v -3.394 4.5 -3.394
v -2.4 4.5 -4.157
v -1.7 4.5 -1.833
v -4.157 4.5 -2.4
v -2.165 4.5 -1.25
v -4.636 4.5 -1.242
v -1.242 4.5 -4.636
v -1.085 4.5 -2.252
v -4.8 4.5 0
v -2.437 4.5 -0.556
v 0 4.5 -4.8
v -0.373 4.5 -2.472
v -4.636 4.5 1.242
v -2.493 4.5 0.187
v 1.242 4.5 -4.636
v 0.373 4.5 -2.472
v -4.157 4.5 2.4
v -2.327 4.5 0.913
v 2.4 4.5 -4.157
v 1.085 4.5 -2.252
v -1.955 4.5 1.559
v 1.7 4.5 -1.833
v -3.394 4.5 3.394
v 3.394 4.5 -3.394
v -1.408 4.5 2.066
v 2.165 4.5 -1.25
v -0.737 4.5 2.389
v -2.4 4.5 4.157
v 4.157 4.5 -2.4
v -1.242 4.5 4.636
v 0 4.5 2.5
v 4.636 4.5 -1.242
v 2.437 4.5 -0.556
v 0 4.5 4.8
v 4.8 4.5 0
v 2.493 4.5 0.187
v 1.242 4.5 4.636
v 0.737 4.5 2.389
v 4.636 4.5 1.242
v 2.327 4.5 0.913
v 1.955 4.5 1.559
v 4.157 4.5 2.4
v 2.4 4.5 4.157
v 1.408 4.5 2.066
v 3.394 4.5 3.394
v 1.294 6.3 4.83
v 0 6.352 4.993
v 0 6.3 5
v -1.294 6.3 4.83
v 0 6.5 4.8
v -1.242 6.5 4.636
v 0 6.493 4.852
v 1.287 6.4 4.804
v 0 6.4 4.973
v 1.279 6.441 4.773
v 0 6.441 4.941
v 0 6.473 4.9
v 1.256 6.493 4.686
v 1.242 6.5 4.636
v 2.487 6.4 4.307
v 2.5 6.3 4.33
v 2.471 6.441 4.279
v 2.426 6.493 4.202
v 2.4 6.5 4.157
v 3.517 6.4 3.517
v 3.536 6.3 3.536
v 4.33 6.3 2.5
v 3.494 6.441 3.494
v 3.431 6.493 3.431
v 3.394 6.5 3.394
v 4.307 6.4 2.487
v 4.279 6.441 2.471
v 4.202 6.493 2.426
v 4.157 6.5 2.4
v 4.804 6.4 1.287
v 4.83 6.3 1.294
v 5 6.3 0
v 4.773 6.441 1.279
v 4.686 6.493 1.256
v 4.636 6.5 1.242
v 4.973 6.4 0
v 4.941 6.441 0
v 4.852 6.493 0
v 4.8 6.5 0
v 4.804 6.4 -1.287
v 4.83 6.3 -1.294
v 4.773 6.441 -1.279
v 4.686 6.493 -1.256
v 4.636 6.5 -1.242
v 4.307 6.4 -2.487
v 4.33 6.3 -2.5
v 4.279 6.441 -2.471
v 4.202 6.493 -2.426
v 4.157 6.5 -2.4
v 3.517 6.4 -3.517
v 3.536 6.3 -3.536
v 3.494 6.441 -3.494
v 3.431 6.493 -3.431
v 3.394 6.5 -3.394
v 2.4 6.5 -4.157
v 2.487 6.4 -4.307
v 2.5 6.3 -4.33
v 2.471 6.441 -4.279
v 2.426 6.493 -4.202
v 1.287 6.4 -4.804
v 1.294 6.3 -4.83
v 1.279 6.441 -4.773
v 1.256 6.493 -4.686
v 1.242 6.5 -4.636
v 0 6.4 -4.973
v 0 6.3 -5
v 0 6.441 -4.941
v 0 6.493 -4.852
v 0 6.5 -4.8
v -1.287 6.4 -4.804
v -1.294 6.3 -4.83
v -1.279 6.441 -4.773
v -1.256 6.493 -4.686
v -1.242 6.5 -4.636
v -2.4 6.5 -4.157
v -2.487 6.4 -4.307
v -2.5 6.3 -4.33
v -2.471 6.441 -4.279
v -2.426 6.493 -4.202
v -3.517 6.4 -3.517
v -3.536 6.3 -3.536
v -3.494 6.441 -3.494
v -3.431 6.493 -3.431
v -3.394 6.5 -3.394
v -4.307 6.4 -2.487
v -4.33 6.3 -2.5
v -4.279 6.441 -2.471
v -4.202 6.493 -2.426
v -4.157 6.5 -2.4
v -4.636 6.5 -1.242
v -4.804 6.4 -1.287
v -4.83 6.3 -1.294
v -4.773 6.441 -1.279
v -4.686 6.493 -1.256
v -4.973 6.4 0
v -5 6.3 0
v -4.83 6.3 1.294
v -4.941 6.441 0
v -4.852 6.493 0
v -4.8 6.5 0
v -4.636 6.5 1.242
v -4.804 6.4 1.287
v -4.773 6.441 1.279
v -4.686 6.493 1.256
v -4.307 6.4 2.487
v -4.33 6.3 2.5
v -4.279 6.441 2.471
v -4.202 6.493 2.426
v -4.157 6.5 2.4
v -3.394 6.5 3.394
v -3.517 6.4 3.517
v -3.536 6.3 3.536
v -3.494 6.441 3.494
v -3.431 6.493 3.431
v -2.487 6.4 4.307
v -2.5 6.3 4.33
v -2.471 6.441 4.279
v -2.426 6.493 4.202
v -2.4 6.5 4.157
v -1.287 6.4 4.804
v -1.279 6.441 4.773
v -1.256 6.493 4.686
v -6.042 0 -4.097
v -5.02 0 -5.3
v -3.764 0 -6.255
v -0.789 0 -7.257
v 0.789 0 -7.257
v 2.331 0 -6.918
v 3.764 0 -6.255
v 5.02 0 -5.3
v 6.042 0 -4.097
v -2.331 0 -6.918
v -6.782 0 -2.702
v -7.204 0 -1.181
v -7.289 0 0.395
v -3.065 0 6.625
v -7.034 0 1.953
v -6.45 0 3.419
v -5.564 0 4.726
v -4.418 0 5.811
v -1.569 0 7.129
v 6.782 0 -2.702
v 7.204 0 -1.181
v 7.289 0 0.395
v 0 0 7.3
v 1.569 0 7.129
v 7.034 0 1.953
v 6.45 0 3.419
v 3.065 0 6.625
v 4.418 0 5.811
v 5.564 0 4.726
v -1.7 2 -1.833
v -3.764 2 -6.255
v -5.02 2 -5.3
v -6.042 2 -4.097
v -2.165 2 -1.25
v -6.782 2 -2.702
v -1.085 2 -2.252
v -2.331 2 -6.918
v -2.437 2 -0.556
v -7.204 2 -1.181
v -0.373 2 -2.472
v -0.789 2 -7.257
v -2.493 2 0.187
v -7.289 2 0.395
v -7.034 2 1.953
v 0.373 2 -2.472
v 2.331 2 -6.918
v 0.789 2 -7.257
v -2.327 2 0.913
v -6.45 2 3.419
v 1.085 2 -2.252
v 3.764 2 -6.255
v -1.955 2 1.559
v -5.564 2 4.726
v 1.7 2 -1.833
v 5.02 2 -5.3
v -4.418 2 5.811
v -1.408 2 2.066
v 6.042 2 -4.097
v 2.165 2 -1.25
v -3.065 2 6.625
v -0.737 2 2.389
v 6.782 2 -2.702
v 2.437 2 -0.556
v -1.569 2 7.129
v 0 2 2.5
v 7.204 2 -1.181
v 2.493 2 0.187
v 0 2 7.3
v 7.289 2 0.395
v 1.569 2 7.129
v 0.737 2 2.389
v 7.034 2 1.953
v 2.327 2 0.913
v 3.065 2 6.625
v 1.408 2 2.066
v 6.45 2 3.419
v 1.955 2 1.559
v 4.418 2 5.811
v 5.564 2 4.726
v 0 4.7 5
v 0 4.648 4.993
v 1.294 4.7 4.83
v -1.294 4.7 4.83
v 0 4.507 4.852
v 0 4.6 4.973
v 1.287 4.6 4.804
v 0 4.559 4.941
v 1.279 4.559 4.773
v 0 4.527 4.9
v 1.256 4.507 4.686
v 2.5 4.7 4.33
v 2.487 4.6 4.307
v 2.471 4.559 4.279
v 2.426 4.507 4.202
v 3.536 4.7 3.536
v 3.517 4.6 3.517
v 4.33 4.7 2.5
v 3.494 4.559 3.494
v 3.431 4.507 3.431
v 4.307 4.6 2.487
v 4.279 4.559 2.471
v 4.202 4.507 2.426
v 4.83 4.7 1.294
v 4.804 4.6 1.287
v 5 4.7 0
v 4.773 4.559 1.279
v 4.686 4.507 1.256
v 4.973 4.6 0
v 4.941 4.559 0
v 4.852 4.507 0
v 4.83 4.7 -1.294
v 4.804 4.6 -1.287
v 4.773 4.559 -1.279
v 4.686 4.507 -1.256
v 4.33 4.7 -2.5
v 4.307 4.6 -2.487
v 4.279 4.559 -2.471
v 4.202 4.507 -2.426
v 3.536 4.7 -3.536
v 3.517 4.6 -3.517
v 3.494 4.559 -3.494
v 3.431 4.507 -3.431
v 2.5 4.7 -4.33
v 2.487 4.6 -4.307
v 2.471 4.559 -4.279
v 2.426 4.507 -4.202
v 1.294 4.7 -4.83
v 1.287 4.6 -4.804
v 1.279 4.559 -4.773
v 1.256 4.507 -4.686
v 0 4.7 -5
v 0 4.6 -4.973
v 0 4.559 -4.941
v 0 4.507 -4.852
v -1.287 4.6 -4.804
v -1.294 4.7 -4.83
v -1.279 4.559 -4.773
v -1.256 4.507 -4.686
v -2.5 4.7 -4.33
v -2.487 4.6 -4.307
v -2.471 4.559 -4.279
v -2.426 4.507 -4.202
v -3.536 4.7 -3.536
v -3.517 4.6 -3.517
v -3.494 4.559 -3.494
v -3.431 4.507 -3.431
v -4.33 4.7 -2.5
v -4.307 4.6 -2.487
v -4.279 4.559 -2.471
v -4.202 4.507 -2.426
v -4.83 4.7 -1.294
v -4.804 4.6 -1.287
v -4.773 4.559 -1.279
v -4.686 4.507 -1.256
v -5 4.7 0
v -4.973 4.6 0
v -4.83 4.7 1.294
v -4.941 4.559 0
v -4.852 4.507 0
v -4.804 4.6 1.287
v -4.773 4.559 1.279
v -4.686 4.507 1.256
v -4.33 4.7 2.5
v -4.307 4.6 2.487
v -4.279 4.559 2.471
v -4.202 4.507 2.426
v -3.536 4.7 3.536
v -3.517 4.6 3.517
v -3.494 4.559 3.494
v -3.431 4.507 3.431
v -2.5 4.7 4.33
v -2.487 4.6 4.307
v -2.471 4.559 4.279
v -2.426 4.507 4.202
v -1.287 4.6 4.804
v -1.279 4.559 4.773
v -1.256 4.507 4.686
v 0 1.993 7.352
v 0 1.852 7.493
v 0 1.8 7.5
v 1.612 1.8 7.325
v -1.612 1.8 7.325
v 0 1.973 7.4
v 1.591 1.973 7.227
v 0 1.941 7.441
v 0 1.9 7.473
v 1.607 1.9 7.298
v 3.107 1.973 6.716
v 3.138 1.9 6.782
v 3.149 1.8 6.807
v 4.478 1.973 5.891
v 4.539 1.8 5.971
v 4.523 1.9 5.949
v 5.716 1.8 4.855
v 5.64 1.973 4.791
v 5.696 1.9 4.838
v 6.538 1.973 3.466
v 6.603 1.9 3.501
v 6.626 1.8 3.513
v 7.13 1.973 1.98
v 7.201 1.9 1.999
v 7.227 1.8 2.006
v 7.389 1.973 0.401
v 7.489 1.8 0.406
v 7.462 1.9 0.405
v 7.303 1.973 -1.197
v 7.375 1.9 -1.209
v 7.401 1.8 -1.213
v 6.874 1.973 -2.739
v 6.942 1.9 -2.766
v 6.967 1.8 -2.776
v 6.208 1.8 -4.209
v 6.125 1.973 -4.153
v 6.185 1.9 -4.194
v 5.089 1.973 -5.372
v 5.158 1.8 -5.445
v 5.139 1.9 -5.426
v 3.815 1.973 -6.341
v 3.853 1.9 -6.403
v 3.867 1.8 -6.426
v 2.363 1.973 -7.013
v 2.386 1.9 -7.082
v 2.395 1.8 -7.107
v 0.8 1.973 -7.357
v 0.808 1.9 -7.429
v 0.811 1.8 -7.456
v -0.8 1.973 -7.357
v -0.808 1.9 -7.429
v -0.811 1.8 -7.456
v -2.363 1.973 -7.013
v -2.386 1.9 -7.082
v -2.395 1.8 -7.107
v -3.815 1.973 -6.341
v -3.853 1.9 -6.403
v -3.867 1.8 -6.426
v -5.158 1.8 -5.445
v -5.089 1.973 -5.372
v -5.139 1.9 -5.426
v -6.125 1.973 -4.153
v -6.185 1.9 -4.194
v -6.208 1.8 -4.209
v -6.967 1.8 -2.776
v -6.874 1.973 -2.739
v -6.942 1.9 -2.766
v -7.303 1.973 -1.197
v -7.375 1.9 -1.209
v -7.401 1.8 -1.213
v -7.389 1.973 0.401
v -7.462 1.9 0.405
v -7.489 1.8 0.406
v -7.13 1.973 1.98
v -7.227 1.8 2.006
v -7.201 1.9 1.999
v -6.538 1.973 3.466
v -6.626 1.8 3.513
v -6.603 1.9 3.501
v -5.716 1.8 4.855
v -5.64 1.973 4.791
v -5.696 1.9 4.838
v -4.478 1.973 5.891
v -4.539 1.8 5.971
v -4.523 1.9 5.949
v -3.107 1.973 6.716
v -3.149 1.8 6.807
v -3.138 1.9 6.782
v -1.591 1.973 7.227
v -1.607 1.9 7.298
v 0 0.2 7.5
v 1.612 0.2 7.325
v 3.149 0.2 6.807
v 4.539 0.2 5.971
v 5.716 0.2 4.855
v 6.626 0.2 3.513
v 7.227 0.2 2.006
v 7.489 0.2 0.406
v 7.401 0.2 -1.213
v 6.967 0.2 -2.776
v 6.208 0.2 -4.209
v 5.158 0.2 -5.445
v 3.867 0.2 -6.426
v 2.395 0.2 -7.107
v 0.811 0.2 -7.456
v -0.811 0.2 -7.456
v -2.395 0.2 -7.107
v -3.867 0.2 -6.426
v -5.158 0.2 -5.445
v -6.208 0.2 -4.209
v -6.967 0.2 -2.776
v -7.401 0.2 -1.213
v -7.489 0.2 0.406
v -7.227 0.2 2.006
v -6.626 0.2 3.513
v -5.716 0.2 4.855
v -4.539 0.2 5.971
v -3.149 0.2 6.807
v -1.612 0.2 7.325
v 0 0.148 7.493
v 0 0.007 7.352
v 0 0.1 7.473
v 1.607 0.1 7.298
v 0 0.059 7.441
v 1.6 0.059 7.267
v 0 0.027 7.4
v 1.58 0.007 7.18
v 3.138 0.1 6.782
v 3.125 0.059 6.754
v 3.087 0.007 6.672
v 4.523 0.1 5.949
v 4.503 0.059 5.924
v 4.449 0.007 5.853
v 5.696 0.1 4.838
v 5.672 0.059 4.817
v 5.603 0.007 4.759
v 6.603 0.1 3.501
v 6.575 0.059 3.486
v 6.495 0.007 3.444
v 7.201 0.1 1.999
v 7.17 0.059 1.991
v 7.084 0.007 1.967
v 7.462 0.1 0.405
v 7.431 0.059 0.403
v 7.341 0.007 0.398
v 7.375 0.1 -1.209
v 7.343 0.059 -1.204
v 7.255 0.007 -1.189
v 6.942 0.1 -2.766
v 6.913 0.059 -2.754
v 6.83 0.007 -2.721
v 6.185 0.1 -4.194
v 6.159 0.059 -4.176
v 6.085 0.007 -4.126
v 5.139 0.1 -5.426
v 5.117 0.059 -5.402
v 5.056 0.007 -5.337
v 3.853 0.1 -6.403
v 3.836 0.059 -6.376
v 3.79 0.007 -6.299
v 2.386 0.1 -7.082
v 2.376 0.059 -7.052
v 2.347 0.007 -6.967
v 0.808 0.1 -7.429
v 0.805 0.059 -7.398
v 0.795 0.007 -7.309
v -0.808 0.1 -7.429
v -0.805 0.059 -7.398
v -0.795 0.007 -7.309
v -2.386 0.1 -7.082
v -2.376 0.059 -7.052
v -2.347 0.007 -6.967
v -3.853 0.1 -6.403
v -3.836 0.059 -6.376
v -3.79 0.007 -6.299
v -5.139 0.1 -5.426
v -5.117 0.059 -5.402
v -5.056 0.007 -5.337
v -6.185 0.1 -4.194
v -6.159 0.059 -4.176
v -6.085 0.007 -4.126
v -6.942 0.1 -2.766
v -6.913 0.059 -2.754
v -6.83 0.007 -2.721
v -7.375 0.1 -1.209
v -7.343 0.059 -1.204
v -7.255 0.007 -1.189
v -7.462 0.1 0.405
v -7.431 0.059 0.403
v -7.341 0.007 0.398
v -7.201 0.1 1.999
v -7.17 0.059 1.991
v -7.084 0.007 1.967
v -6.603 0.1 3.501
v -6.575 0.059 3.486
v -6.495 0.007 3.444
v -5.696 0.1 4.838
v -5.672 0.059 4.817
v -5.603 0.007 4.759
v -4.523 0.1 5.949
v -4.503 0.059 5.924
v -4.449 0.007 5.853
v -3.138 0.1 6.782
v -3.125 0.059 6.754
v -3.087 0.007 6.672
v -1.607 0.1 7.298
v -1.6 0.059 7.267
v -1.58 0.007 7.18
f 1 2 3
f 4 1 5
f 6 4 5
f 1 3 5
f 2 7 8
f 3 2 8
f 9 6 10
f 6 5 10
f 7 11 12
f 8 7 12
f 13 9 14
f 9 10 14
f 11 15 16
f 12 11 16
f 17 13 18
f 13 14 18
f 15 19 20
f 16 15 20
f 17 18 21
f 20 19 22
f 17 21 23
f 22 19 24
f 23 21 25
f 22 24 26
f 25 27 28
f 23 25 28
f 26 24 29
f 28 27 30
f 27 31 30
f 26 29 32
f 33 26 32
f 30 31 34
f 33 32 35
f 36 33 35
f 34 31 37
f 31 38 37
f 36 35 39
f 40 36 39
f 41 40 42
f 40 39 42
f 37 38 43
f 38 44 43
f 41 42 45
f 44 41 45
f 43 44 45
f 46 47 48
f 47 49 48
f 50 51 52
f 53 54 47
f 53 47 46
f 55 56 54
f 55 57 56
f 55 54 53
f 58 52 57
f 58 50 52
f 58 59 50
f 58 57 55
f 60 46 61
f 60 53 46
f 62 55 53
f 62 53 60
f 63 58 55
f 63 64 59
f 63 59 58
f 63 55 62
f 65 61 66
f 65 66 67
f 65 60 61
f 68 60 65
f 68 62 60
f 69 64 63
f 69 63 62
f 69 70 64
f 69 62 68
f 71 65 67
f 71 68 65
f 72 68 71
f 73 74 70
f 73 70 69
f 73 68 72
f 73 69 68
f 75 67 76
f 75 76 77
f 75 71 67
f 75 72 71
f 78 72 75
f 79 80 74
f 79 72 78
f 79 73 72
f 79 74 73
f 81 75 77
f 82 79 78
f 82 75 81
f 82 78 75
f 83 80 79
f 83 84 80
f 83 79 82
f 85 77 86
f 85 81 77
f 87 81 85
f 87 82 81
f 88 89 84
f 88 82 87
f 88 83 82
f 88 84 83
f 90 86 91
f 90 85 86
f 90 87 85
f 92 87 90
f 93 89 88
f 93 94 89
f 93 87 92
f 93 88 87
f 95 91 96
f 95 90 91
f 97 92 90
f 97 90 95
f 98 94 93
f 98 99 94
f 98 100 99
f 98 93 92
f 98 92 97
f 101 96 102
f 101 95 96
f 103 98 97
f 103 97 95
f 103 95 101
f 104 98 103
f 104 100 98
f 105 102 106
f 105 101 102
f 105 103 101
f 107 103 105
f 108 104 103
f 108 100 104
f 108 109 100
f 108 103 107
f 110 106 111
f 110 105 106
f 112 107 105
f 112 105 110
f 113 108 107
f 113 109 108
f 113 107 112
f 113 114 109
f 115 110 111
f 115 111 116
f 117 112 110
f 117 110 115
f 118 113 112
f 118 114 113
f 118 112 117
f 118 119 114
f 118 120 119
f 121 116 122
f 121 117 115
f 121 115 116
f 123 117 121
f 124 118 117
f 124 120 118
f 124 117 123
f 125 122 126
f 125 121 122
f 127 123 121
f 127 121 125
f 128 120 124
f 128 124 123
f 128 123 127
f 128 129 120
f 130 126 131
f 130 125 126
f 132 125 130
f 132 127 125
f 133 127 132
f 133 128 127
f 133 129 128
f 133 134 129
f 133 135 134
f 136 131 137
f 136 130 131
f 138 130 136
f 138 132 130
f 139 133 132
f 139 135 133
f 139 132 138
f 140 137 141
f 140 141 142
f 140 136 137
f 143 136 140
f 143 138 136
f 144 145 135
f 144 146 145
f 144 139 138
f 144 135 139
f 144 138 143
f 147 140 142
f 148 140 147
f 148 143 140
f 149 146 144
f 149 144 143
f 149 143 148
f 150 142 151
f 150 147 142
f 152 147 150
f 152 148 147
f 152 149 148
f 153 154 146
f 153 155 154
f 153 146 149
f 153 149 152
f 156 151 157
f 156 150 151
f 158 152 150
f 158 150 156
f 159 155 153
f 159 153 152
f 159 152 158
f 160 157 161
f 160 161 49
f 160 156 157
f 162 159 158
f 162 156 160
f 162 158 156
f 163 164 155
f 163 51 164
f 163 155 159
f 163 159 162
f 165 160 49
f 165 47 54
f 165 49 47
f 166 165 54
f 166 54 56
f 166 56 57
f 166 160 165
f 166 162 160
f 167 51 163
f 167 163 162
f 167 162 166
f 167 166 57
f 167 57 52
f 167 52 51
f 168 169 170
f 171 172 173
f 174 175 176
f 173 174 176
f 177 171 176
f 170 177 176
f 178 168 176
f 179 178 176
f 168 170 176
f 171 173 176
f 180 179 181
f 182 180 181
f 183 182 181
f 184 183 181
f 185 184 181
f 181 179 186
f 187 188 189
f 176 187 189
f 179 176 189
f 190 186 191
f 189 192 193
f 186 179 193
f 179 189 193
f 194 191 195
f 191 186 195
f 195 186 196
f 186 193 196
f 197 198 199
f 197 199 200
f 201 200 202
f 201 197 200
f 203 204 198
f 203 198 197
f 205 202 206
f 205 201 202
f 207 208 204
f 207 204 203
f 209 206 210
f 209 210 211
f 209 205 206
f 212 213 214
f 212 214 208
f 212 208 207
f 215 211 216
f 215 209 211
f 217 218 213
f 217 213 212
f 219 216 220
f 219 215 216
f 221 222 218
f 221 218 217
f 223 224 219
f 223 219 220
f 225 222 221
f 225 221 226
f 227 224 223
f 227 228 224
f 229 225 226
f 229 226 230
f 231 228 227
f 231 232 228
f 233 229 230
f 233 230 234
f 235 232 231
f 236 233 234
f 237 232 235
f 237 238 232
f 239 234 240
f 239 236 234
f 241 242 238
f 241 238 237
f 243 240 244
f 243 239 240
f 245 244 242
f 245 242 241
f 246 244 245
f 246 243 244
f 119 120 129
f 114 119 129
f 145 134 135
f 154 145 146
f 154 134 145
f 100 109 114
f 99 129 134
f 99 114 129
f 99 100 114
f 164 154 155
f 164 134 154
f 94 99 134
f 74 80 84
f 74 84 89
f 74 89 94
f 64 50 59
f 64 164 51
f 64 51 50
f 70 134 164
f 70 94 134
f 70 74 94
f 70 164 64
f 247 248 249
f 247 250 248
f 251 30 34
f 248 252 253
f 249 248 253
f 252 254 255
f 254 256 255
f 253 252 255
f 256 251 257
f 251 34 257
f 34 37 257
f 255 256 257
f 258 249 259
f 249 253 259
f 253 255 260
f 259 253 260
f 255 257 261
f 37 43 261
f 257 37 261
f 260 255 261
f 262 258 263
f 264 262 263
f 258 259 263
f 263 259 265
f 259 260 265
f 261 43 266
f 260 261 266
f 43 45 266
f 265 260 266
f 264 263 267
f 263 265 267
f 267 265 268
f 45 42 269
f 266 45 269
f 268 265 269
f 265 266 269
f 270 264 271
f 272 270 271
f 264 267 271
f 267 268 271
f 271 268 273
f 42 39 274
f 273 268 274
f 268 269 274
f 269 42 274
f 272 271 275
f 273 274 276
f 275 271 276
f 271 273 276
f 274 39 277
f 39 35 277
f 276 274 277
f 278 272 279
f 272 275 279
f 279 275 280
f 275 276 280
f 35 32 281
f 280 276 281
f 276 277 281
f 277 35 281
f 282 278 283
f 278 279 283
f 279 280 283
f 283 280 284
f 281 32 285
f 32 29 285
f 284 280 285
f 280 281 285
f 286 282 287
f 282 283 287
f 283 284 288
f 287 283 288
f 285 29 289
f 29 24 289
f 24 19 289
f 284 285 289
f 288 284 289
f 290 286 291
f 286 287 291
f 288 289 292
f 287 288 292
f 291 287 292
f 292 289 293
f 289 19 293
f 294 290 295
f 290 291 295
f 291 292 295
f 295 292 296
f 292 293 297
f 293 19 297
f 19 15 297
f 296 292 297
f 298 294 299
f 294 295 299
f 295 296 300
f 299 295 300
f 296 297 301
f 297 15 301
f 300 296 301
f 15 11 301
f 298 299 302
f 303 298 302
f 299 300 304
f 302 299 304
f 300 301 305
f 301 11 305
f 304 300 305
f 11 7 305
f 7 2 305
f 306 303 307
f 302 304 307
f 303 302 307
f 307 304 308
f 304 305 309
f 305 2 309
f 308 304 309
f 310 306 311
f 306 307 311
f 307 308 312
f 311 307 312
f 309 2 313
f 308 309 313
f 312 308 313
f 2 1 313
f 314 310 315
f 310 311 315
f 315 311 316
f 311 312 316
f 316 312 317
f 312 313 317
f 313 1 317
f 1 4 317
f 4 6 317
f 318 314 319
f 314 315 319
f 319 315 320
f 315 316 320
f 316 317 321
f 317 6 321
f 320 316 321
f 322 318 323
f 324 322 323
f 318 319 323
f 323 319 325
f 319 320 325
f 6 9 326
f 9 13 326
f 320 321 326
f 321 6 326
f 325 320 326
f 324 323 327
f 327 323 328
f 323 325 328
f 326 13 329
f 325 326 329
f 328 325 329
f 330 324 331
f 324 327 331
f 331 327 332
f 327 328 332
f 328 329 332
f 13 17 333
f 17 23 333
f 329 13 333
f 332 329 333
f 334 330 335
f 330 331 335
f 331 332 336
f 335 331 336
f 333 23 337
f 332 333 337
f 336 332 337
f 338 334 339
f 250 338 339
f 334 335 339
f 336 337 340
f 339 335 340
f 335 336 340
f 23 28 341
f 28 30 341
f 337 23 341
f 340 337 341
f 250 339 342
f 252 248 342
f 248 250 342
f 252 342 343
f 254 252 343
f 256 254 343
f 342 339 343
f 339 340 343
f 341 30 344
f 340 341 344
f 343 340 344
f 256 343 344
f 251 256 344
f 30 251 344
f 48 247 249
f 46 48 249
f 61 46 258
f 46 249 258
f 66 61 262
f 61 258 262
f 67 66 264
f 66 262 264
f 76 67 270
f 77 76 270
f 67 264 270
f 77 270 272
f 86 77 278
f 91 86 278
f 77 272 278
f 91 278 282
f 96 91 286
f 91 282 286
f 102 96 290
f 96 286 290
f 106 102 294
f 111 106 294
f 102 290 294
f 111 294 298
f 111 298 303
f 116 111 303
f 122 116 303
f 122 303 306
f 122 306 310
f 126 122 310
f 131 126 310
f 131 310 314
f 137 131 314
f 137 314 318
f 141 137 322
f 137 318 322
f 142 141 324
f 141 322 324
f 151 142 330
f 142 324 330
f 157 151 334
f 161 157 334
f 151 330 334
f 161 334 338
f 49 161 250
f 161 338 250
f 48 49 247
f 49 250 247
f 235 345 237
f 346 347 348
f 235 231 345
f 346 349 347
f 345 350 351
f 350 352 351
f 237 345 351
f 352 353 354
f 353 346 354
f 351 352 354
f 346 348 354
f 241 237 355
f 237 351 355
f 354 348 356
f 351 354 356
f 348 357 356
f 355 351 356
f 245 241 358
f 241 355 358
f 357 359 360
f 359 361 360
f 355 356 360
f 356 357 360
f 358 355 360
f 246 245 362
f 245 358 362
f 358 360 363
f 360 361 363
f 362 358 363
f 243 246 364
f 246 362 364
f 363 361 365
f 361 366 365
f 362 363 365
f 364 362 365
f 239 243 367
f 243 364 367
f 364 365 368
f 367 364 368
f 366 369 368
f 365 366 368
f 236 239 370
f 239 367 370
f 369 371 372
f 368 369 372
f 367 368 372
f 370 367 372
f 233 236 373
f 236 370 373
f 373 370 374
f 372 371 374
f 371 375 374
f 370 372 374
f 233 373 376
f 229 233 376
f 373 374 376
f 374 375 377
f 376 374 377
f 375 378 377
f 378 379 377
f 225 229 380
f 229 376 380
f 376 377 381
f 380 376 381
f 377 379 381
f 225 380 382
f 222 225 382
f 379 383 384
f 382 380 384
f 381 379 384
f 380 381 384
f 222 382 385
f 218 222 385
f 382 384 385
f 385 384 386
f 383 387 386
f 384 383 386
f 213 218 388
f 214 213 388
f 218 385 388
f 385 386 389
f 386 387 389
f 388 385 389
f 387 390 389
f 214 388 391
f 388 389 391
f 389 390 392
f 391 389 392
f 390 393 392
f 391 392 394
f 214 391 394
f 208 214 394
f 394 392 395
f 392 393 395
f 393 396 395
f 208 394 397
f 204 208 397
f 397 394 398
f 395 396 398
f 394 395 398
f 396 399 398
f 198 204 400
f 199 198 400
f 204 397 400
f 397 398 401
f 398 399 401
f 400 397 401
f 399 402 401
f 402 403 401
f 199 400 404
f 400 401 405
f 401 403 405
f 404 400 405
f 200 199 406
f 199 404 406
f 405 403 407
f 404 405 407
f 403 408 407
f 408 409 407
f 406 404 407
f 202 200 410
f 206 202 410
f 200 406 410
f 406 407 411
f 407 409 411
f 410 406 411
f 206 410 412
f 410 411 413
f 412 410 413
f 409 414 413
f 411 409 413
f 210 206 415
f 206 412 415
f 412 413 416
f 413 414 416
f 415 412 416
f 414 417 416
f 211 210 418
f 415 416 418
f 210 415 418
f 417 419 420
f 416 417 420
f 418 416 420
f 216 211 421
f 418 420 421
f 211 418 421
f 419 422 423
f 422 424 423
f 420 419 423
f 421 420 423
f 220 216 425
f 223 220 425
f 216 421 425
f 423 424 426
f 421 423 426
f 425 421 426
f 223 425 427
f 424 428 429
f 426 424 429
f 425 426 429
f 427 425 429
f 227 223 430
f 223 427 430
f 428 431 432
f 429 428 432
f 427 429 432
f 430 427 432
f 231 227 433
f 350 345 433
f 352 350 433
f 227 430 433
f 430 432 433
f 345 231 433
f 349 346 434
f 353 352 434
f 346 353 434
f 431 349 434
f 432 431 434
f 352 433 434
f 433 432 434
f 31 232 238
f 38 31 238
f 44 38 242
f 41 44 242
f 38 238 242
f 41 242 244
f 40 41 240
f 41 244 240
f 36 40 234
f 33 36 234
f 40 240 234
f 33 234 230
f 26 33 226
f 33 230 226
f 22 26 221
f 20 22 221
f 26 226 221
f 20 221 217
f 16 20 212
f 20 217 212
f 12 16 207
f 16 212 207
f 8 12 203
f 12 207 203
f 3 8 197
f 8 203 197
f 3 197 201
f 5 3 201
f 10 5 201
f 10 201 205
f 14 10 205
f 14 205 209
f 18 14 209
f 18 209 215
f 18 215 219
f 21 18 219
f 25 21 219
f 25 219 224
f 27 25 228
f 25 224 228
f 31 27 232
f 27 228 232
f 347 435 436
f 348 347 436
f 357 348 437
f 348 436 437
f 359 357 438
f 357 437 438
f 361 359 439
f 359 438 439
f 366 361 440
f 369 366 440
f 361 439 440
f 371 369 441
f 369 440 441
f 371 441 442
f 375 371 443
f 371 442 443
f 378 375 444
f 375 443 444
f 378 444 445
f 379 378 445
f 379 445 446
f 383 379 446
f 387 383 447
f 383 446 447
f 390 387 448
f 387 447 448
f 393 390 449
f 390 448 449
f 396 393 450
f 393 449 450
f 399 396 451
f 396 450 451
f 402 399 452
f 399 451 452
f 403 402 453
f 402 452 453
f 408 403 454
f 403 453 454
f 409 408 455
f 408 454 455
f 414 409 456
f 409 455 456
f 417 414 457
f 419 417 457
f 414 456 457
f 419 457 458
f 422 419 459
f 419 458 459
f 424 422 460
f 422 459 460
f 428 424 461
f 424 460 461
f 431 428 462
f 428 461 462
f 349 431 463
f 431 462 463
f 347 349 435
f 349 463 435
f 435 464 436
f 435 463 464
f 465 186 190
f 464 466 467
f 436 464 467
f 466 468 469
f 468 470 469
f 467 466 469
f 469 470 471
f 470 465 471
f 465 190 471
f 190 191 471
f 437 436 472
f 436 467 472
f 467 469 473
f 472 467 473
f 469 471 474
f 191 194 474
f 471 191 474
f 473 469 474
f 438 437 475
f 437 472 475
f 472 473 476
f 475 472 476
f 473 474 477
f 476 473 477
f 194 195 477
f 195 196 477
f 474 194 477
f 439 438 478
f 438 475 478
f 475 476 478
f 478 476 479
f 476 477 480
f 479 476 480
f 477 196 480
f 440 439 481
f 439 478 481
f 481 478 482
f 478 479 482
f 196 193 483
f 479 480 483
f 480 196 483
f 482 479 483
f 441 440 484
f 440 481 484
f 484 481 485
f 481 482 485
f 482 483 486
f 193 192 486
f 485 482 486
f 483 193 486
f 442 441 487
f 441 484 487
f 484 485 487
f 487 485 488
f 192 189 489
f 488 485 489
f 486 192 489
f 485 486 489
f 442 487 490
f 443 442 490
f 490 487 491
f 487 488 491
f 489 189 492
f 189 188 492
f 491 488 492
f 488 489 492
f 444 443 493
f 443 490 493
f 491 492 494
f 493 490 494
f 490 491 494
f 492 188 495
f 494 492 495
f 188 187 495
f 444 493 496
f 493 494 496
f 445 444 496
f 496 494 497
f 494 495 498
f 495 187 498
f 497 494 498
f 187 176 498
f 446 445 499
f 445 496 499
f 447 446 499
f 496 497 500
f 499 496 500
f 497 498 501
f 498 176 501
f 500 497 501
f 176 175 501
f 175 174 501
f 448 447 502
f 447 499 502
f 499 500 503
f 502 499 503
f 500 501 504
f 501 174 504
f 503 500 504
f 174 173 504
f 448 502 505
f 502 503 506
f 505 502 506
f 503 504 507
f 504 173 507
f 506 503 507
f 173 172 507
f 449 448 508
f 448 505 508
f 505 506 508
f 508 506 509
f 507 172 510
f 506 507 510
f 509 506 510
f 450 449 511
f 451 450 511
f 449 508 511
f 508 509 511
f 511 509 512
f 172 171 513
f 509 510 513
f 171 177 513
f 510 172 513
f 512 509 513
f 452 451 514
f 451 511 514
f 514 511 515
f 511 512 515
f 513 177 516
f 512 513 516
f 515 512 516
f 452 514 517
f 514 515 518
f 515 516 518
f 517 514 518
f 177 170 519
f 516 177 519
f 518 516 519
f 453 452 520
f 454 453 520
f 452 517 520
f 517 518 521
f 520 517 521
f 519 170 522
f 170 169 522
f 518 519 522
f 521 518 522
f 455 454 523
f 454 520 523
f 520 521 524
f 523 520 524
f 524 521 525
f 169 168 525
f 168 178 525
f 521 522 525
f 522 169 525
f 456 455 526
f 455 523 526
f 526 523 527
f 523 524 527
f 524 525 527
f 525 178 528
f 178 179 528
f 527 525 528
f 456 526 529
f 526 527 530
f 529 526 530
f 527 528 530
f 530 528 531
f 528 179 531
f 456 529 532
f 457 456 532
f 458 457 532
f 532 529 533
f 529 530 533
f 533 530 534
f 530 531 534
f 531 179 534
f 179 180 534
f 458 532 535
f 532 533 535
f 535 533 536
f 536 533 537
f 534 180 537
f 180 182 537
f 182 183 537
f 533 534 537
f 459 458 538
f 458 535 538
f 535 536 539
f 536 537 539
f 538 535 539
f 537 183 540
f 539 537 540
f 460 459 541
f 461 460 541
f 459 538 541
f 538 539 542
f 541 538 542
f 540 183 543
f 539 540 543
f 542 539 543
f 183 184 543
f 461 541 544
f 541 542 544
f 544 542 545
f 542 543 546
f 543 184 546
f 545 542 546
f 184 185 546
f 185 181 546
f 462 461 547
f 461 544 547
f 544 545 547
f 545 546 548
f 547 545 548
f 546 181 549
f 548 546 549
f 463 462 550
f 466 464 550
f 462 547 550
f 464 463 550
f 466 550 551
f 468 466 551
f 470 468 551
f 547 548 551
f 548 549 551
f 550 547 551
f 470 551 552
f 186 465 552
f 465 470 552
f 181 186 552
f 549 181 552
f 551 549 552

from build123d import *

# Parameters (mm, degrees)
SKETCH1_R           = 7.5
BOSS_EXTRUDE1_DEPTH = 2
SKETCH2_R           = 2.5
BOSS_EXTRUDE2_DEPTH = 2.5
SKETCH3_R           = 5
BOSS_EXTRUDE3_DEPTH = 2
FILLET1_R           = 0.2


with BuildPart() as part:
    # Sketch1 → Boss-Extrude1 (new body)
    with BuildSketch(Plane(origin=(0, 0, 0), x_dir=(1, 0, 0), z_dir=(0, 1, 0))):
        with Locations(Location((0, 0, 0), (0, 0, 270))):
            Circle(SKETCH1_R)
    extrude(amount=BOSS_EXTRUDE1_DEPTH)

    # Sketch2 → Boss-Extrude2 (add)
    with BuildSketch(Plane(origin=(0, 2, 0), x_dir=(1, 0, 0), z_dir=(0, 1, 0))):
        with Locations(Location((0, 0, 0), (0, 0, 270))):
            Circle(SKETCH2_R)
    extrude(amount=BOSS_EXTRUDE2_DEPTH)

    # Sketch3 → Boss-Extrude3 (add)
    with BuildSketch(Plane(origin=(0, 4.5, 0), x_dir=(1, 0, 0), z_dir=(0, 1, 0))):
        with Locations(Location((0, 0, 0), (0, 0, 270))):
            Circle(SKETCH3_R)
    extrude(amount=BOSS_EXTRUDE3_DEPTH)

    # Fillet1
    fillet1_edges = [part.edges().sort_by_distance(p)[0] for p in [
        (0, 6.5, -5),
        (0, 0, -7.5),
        (0, 2, -7.5),
        (0, 4.5, -5),
    ]]
    fillet(fillet1_edges, radius=FILLET1_R)


solid = part.part
